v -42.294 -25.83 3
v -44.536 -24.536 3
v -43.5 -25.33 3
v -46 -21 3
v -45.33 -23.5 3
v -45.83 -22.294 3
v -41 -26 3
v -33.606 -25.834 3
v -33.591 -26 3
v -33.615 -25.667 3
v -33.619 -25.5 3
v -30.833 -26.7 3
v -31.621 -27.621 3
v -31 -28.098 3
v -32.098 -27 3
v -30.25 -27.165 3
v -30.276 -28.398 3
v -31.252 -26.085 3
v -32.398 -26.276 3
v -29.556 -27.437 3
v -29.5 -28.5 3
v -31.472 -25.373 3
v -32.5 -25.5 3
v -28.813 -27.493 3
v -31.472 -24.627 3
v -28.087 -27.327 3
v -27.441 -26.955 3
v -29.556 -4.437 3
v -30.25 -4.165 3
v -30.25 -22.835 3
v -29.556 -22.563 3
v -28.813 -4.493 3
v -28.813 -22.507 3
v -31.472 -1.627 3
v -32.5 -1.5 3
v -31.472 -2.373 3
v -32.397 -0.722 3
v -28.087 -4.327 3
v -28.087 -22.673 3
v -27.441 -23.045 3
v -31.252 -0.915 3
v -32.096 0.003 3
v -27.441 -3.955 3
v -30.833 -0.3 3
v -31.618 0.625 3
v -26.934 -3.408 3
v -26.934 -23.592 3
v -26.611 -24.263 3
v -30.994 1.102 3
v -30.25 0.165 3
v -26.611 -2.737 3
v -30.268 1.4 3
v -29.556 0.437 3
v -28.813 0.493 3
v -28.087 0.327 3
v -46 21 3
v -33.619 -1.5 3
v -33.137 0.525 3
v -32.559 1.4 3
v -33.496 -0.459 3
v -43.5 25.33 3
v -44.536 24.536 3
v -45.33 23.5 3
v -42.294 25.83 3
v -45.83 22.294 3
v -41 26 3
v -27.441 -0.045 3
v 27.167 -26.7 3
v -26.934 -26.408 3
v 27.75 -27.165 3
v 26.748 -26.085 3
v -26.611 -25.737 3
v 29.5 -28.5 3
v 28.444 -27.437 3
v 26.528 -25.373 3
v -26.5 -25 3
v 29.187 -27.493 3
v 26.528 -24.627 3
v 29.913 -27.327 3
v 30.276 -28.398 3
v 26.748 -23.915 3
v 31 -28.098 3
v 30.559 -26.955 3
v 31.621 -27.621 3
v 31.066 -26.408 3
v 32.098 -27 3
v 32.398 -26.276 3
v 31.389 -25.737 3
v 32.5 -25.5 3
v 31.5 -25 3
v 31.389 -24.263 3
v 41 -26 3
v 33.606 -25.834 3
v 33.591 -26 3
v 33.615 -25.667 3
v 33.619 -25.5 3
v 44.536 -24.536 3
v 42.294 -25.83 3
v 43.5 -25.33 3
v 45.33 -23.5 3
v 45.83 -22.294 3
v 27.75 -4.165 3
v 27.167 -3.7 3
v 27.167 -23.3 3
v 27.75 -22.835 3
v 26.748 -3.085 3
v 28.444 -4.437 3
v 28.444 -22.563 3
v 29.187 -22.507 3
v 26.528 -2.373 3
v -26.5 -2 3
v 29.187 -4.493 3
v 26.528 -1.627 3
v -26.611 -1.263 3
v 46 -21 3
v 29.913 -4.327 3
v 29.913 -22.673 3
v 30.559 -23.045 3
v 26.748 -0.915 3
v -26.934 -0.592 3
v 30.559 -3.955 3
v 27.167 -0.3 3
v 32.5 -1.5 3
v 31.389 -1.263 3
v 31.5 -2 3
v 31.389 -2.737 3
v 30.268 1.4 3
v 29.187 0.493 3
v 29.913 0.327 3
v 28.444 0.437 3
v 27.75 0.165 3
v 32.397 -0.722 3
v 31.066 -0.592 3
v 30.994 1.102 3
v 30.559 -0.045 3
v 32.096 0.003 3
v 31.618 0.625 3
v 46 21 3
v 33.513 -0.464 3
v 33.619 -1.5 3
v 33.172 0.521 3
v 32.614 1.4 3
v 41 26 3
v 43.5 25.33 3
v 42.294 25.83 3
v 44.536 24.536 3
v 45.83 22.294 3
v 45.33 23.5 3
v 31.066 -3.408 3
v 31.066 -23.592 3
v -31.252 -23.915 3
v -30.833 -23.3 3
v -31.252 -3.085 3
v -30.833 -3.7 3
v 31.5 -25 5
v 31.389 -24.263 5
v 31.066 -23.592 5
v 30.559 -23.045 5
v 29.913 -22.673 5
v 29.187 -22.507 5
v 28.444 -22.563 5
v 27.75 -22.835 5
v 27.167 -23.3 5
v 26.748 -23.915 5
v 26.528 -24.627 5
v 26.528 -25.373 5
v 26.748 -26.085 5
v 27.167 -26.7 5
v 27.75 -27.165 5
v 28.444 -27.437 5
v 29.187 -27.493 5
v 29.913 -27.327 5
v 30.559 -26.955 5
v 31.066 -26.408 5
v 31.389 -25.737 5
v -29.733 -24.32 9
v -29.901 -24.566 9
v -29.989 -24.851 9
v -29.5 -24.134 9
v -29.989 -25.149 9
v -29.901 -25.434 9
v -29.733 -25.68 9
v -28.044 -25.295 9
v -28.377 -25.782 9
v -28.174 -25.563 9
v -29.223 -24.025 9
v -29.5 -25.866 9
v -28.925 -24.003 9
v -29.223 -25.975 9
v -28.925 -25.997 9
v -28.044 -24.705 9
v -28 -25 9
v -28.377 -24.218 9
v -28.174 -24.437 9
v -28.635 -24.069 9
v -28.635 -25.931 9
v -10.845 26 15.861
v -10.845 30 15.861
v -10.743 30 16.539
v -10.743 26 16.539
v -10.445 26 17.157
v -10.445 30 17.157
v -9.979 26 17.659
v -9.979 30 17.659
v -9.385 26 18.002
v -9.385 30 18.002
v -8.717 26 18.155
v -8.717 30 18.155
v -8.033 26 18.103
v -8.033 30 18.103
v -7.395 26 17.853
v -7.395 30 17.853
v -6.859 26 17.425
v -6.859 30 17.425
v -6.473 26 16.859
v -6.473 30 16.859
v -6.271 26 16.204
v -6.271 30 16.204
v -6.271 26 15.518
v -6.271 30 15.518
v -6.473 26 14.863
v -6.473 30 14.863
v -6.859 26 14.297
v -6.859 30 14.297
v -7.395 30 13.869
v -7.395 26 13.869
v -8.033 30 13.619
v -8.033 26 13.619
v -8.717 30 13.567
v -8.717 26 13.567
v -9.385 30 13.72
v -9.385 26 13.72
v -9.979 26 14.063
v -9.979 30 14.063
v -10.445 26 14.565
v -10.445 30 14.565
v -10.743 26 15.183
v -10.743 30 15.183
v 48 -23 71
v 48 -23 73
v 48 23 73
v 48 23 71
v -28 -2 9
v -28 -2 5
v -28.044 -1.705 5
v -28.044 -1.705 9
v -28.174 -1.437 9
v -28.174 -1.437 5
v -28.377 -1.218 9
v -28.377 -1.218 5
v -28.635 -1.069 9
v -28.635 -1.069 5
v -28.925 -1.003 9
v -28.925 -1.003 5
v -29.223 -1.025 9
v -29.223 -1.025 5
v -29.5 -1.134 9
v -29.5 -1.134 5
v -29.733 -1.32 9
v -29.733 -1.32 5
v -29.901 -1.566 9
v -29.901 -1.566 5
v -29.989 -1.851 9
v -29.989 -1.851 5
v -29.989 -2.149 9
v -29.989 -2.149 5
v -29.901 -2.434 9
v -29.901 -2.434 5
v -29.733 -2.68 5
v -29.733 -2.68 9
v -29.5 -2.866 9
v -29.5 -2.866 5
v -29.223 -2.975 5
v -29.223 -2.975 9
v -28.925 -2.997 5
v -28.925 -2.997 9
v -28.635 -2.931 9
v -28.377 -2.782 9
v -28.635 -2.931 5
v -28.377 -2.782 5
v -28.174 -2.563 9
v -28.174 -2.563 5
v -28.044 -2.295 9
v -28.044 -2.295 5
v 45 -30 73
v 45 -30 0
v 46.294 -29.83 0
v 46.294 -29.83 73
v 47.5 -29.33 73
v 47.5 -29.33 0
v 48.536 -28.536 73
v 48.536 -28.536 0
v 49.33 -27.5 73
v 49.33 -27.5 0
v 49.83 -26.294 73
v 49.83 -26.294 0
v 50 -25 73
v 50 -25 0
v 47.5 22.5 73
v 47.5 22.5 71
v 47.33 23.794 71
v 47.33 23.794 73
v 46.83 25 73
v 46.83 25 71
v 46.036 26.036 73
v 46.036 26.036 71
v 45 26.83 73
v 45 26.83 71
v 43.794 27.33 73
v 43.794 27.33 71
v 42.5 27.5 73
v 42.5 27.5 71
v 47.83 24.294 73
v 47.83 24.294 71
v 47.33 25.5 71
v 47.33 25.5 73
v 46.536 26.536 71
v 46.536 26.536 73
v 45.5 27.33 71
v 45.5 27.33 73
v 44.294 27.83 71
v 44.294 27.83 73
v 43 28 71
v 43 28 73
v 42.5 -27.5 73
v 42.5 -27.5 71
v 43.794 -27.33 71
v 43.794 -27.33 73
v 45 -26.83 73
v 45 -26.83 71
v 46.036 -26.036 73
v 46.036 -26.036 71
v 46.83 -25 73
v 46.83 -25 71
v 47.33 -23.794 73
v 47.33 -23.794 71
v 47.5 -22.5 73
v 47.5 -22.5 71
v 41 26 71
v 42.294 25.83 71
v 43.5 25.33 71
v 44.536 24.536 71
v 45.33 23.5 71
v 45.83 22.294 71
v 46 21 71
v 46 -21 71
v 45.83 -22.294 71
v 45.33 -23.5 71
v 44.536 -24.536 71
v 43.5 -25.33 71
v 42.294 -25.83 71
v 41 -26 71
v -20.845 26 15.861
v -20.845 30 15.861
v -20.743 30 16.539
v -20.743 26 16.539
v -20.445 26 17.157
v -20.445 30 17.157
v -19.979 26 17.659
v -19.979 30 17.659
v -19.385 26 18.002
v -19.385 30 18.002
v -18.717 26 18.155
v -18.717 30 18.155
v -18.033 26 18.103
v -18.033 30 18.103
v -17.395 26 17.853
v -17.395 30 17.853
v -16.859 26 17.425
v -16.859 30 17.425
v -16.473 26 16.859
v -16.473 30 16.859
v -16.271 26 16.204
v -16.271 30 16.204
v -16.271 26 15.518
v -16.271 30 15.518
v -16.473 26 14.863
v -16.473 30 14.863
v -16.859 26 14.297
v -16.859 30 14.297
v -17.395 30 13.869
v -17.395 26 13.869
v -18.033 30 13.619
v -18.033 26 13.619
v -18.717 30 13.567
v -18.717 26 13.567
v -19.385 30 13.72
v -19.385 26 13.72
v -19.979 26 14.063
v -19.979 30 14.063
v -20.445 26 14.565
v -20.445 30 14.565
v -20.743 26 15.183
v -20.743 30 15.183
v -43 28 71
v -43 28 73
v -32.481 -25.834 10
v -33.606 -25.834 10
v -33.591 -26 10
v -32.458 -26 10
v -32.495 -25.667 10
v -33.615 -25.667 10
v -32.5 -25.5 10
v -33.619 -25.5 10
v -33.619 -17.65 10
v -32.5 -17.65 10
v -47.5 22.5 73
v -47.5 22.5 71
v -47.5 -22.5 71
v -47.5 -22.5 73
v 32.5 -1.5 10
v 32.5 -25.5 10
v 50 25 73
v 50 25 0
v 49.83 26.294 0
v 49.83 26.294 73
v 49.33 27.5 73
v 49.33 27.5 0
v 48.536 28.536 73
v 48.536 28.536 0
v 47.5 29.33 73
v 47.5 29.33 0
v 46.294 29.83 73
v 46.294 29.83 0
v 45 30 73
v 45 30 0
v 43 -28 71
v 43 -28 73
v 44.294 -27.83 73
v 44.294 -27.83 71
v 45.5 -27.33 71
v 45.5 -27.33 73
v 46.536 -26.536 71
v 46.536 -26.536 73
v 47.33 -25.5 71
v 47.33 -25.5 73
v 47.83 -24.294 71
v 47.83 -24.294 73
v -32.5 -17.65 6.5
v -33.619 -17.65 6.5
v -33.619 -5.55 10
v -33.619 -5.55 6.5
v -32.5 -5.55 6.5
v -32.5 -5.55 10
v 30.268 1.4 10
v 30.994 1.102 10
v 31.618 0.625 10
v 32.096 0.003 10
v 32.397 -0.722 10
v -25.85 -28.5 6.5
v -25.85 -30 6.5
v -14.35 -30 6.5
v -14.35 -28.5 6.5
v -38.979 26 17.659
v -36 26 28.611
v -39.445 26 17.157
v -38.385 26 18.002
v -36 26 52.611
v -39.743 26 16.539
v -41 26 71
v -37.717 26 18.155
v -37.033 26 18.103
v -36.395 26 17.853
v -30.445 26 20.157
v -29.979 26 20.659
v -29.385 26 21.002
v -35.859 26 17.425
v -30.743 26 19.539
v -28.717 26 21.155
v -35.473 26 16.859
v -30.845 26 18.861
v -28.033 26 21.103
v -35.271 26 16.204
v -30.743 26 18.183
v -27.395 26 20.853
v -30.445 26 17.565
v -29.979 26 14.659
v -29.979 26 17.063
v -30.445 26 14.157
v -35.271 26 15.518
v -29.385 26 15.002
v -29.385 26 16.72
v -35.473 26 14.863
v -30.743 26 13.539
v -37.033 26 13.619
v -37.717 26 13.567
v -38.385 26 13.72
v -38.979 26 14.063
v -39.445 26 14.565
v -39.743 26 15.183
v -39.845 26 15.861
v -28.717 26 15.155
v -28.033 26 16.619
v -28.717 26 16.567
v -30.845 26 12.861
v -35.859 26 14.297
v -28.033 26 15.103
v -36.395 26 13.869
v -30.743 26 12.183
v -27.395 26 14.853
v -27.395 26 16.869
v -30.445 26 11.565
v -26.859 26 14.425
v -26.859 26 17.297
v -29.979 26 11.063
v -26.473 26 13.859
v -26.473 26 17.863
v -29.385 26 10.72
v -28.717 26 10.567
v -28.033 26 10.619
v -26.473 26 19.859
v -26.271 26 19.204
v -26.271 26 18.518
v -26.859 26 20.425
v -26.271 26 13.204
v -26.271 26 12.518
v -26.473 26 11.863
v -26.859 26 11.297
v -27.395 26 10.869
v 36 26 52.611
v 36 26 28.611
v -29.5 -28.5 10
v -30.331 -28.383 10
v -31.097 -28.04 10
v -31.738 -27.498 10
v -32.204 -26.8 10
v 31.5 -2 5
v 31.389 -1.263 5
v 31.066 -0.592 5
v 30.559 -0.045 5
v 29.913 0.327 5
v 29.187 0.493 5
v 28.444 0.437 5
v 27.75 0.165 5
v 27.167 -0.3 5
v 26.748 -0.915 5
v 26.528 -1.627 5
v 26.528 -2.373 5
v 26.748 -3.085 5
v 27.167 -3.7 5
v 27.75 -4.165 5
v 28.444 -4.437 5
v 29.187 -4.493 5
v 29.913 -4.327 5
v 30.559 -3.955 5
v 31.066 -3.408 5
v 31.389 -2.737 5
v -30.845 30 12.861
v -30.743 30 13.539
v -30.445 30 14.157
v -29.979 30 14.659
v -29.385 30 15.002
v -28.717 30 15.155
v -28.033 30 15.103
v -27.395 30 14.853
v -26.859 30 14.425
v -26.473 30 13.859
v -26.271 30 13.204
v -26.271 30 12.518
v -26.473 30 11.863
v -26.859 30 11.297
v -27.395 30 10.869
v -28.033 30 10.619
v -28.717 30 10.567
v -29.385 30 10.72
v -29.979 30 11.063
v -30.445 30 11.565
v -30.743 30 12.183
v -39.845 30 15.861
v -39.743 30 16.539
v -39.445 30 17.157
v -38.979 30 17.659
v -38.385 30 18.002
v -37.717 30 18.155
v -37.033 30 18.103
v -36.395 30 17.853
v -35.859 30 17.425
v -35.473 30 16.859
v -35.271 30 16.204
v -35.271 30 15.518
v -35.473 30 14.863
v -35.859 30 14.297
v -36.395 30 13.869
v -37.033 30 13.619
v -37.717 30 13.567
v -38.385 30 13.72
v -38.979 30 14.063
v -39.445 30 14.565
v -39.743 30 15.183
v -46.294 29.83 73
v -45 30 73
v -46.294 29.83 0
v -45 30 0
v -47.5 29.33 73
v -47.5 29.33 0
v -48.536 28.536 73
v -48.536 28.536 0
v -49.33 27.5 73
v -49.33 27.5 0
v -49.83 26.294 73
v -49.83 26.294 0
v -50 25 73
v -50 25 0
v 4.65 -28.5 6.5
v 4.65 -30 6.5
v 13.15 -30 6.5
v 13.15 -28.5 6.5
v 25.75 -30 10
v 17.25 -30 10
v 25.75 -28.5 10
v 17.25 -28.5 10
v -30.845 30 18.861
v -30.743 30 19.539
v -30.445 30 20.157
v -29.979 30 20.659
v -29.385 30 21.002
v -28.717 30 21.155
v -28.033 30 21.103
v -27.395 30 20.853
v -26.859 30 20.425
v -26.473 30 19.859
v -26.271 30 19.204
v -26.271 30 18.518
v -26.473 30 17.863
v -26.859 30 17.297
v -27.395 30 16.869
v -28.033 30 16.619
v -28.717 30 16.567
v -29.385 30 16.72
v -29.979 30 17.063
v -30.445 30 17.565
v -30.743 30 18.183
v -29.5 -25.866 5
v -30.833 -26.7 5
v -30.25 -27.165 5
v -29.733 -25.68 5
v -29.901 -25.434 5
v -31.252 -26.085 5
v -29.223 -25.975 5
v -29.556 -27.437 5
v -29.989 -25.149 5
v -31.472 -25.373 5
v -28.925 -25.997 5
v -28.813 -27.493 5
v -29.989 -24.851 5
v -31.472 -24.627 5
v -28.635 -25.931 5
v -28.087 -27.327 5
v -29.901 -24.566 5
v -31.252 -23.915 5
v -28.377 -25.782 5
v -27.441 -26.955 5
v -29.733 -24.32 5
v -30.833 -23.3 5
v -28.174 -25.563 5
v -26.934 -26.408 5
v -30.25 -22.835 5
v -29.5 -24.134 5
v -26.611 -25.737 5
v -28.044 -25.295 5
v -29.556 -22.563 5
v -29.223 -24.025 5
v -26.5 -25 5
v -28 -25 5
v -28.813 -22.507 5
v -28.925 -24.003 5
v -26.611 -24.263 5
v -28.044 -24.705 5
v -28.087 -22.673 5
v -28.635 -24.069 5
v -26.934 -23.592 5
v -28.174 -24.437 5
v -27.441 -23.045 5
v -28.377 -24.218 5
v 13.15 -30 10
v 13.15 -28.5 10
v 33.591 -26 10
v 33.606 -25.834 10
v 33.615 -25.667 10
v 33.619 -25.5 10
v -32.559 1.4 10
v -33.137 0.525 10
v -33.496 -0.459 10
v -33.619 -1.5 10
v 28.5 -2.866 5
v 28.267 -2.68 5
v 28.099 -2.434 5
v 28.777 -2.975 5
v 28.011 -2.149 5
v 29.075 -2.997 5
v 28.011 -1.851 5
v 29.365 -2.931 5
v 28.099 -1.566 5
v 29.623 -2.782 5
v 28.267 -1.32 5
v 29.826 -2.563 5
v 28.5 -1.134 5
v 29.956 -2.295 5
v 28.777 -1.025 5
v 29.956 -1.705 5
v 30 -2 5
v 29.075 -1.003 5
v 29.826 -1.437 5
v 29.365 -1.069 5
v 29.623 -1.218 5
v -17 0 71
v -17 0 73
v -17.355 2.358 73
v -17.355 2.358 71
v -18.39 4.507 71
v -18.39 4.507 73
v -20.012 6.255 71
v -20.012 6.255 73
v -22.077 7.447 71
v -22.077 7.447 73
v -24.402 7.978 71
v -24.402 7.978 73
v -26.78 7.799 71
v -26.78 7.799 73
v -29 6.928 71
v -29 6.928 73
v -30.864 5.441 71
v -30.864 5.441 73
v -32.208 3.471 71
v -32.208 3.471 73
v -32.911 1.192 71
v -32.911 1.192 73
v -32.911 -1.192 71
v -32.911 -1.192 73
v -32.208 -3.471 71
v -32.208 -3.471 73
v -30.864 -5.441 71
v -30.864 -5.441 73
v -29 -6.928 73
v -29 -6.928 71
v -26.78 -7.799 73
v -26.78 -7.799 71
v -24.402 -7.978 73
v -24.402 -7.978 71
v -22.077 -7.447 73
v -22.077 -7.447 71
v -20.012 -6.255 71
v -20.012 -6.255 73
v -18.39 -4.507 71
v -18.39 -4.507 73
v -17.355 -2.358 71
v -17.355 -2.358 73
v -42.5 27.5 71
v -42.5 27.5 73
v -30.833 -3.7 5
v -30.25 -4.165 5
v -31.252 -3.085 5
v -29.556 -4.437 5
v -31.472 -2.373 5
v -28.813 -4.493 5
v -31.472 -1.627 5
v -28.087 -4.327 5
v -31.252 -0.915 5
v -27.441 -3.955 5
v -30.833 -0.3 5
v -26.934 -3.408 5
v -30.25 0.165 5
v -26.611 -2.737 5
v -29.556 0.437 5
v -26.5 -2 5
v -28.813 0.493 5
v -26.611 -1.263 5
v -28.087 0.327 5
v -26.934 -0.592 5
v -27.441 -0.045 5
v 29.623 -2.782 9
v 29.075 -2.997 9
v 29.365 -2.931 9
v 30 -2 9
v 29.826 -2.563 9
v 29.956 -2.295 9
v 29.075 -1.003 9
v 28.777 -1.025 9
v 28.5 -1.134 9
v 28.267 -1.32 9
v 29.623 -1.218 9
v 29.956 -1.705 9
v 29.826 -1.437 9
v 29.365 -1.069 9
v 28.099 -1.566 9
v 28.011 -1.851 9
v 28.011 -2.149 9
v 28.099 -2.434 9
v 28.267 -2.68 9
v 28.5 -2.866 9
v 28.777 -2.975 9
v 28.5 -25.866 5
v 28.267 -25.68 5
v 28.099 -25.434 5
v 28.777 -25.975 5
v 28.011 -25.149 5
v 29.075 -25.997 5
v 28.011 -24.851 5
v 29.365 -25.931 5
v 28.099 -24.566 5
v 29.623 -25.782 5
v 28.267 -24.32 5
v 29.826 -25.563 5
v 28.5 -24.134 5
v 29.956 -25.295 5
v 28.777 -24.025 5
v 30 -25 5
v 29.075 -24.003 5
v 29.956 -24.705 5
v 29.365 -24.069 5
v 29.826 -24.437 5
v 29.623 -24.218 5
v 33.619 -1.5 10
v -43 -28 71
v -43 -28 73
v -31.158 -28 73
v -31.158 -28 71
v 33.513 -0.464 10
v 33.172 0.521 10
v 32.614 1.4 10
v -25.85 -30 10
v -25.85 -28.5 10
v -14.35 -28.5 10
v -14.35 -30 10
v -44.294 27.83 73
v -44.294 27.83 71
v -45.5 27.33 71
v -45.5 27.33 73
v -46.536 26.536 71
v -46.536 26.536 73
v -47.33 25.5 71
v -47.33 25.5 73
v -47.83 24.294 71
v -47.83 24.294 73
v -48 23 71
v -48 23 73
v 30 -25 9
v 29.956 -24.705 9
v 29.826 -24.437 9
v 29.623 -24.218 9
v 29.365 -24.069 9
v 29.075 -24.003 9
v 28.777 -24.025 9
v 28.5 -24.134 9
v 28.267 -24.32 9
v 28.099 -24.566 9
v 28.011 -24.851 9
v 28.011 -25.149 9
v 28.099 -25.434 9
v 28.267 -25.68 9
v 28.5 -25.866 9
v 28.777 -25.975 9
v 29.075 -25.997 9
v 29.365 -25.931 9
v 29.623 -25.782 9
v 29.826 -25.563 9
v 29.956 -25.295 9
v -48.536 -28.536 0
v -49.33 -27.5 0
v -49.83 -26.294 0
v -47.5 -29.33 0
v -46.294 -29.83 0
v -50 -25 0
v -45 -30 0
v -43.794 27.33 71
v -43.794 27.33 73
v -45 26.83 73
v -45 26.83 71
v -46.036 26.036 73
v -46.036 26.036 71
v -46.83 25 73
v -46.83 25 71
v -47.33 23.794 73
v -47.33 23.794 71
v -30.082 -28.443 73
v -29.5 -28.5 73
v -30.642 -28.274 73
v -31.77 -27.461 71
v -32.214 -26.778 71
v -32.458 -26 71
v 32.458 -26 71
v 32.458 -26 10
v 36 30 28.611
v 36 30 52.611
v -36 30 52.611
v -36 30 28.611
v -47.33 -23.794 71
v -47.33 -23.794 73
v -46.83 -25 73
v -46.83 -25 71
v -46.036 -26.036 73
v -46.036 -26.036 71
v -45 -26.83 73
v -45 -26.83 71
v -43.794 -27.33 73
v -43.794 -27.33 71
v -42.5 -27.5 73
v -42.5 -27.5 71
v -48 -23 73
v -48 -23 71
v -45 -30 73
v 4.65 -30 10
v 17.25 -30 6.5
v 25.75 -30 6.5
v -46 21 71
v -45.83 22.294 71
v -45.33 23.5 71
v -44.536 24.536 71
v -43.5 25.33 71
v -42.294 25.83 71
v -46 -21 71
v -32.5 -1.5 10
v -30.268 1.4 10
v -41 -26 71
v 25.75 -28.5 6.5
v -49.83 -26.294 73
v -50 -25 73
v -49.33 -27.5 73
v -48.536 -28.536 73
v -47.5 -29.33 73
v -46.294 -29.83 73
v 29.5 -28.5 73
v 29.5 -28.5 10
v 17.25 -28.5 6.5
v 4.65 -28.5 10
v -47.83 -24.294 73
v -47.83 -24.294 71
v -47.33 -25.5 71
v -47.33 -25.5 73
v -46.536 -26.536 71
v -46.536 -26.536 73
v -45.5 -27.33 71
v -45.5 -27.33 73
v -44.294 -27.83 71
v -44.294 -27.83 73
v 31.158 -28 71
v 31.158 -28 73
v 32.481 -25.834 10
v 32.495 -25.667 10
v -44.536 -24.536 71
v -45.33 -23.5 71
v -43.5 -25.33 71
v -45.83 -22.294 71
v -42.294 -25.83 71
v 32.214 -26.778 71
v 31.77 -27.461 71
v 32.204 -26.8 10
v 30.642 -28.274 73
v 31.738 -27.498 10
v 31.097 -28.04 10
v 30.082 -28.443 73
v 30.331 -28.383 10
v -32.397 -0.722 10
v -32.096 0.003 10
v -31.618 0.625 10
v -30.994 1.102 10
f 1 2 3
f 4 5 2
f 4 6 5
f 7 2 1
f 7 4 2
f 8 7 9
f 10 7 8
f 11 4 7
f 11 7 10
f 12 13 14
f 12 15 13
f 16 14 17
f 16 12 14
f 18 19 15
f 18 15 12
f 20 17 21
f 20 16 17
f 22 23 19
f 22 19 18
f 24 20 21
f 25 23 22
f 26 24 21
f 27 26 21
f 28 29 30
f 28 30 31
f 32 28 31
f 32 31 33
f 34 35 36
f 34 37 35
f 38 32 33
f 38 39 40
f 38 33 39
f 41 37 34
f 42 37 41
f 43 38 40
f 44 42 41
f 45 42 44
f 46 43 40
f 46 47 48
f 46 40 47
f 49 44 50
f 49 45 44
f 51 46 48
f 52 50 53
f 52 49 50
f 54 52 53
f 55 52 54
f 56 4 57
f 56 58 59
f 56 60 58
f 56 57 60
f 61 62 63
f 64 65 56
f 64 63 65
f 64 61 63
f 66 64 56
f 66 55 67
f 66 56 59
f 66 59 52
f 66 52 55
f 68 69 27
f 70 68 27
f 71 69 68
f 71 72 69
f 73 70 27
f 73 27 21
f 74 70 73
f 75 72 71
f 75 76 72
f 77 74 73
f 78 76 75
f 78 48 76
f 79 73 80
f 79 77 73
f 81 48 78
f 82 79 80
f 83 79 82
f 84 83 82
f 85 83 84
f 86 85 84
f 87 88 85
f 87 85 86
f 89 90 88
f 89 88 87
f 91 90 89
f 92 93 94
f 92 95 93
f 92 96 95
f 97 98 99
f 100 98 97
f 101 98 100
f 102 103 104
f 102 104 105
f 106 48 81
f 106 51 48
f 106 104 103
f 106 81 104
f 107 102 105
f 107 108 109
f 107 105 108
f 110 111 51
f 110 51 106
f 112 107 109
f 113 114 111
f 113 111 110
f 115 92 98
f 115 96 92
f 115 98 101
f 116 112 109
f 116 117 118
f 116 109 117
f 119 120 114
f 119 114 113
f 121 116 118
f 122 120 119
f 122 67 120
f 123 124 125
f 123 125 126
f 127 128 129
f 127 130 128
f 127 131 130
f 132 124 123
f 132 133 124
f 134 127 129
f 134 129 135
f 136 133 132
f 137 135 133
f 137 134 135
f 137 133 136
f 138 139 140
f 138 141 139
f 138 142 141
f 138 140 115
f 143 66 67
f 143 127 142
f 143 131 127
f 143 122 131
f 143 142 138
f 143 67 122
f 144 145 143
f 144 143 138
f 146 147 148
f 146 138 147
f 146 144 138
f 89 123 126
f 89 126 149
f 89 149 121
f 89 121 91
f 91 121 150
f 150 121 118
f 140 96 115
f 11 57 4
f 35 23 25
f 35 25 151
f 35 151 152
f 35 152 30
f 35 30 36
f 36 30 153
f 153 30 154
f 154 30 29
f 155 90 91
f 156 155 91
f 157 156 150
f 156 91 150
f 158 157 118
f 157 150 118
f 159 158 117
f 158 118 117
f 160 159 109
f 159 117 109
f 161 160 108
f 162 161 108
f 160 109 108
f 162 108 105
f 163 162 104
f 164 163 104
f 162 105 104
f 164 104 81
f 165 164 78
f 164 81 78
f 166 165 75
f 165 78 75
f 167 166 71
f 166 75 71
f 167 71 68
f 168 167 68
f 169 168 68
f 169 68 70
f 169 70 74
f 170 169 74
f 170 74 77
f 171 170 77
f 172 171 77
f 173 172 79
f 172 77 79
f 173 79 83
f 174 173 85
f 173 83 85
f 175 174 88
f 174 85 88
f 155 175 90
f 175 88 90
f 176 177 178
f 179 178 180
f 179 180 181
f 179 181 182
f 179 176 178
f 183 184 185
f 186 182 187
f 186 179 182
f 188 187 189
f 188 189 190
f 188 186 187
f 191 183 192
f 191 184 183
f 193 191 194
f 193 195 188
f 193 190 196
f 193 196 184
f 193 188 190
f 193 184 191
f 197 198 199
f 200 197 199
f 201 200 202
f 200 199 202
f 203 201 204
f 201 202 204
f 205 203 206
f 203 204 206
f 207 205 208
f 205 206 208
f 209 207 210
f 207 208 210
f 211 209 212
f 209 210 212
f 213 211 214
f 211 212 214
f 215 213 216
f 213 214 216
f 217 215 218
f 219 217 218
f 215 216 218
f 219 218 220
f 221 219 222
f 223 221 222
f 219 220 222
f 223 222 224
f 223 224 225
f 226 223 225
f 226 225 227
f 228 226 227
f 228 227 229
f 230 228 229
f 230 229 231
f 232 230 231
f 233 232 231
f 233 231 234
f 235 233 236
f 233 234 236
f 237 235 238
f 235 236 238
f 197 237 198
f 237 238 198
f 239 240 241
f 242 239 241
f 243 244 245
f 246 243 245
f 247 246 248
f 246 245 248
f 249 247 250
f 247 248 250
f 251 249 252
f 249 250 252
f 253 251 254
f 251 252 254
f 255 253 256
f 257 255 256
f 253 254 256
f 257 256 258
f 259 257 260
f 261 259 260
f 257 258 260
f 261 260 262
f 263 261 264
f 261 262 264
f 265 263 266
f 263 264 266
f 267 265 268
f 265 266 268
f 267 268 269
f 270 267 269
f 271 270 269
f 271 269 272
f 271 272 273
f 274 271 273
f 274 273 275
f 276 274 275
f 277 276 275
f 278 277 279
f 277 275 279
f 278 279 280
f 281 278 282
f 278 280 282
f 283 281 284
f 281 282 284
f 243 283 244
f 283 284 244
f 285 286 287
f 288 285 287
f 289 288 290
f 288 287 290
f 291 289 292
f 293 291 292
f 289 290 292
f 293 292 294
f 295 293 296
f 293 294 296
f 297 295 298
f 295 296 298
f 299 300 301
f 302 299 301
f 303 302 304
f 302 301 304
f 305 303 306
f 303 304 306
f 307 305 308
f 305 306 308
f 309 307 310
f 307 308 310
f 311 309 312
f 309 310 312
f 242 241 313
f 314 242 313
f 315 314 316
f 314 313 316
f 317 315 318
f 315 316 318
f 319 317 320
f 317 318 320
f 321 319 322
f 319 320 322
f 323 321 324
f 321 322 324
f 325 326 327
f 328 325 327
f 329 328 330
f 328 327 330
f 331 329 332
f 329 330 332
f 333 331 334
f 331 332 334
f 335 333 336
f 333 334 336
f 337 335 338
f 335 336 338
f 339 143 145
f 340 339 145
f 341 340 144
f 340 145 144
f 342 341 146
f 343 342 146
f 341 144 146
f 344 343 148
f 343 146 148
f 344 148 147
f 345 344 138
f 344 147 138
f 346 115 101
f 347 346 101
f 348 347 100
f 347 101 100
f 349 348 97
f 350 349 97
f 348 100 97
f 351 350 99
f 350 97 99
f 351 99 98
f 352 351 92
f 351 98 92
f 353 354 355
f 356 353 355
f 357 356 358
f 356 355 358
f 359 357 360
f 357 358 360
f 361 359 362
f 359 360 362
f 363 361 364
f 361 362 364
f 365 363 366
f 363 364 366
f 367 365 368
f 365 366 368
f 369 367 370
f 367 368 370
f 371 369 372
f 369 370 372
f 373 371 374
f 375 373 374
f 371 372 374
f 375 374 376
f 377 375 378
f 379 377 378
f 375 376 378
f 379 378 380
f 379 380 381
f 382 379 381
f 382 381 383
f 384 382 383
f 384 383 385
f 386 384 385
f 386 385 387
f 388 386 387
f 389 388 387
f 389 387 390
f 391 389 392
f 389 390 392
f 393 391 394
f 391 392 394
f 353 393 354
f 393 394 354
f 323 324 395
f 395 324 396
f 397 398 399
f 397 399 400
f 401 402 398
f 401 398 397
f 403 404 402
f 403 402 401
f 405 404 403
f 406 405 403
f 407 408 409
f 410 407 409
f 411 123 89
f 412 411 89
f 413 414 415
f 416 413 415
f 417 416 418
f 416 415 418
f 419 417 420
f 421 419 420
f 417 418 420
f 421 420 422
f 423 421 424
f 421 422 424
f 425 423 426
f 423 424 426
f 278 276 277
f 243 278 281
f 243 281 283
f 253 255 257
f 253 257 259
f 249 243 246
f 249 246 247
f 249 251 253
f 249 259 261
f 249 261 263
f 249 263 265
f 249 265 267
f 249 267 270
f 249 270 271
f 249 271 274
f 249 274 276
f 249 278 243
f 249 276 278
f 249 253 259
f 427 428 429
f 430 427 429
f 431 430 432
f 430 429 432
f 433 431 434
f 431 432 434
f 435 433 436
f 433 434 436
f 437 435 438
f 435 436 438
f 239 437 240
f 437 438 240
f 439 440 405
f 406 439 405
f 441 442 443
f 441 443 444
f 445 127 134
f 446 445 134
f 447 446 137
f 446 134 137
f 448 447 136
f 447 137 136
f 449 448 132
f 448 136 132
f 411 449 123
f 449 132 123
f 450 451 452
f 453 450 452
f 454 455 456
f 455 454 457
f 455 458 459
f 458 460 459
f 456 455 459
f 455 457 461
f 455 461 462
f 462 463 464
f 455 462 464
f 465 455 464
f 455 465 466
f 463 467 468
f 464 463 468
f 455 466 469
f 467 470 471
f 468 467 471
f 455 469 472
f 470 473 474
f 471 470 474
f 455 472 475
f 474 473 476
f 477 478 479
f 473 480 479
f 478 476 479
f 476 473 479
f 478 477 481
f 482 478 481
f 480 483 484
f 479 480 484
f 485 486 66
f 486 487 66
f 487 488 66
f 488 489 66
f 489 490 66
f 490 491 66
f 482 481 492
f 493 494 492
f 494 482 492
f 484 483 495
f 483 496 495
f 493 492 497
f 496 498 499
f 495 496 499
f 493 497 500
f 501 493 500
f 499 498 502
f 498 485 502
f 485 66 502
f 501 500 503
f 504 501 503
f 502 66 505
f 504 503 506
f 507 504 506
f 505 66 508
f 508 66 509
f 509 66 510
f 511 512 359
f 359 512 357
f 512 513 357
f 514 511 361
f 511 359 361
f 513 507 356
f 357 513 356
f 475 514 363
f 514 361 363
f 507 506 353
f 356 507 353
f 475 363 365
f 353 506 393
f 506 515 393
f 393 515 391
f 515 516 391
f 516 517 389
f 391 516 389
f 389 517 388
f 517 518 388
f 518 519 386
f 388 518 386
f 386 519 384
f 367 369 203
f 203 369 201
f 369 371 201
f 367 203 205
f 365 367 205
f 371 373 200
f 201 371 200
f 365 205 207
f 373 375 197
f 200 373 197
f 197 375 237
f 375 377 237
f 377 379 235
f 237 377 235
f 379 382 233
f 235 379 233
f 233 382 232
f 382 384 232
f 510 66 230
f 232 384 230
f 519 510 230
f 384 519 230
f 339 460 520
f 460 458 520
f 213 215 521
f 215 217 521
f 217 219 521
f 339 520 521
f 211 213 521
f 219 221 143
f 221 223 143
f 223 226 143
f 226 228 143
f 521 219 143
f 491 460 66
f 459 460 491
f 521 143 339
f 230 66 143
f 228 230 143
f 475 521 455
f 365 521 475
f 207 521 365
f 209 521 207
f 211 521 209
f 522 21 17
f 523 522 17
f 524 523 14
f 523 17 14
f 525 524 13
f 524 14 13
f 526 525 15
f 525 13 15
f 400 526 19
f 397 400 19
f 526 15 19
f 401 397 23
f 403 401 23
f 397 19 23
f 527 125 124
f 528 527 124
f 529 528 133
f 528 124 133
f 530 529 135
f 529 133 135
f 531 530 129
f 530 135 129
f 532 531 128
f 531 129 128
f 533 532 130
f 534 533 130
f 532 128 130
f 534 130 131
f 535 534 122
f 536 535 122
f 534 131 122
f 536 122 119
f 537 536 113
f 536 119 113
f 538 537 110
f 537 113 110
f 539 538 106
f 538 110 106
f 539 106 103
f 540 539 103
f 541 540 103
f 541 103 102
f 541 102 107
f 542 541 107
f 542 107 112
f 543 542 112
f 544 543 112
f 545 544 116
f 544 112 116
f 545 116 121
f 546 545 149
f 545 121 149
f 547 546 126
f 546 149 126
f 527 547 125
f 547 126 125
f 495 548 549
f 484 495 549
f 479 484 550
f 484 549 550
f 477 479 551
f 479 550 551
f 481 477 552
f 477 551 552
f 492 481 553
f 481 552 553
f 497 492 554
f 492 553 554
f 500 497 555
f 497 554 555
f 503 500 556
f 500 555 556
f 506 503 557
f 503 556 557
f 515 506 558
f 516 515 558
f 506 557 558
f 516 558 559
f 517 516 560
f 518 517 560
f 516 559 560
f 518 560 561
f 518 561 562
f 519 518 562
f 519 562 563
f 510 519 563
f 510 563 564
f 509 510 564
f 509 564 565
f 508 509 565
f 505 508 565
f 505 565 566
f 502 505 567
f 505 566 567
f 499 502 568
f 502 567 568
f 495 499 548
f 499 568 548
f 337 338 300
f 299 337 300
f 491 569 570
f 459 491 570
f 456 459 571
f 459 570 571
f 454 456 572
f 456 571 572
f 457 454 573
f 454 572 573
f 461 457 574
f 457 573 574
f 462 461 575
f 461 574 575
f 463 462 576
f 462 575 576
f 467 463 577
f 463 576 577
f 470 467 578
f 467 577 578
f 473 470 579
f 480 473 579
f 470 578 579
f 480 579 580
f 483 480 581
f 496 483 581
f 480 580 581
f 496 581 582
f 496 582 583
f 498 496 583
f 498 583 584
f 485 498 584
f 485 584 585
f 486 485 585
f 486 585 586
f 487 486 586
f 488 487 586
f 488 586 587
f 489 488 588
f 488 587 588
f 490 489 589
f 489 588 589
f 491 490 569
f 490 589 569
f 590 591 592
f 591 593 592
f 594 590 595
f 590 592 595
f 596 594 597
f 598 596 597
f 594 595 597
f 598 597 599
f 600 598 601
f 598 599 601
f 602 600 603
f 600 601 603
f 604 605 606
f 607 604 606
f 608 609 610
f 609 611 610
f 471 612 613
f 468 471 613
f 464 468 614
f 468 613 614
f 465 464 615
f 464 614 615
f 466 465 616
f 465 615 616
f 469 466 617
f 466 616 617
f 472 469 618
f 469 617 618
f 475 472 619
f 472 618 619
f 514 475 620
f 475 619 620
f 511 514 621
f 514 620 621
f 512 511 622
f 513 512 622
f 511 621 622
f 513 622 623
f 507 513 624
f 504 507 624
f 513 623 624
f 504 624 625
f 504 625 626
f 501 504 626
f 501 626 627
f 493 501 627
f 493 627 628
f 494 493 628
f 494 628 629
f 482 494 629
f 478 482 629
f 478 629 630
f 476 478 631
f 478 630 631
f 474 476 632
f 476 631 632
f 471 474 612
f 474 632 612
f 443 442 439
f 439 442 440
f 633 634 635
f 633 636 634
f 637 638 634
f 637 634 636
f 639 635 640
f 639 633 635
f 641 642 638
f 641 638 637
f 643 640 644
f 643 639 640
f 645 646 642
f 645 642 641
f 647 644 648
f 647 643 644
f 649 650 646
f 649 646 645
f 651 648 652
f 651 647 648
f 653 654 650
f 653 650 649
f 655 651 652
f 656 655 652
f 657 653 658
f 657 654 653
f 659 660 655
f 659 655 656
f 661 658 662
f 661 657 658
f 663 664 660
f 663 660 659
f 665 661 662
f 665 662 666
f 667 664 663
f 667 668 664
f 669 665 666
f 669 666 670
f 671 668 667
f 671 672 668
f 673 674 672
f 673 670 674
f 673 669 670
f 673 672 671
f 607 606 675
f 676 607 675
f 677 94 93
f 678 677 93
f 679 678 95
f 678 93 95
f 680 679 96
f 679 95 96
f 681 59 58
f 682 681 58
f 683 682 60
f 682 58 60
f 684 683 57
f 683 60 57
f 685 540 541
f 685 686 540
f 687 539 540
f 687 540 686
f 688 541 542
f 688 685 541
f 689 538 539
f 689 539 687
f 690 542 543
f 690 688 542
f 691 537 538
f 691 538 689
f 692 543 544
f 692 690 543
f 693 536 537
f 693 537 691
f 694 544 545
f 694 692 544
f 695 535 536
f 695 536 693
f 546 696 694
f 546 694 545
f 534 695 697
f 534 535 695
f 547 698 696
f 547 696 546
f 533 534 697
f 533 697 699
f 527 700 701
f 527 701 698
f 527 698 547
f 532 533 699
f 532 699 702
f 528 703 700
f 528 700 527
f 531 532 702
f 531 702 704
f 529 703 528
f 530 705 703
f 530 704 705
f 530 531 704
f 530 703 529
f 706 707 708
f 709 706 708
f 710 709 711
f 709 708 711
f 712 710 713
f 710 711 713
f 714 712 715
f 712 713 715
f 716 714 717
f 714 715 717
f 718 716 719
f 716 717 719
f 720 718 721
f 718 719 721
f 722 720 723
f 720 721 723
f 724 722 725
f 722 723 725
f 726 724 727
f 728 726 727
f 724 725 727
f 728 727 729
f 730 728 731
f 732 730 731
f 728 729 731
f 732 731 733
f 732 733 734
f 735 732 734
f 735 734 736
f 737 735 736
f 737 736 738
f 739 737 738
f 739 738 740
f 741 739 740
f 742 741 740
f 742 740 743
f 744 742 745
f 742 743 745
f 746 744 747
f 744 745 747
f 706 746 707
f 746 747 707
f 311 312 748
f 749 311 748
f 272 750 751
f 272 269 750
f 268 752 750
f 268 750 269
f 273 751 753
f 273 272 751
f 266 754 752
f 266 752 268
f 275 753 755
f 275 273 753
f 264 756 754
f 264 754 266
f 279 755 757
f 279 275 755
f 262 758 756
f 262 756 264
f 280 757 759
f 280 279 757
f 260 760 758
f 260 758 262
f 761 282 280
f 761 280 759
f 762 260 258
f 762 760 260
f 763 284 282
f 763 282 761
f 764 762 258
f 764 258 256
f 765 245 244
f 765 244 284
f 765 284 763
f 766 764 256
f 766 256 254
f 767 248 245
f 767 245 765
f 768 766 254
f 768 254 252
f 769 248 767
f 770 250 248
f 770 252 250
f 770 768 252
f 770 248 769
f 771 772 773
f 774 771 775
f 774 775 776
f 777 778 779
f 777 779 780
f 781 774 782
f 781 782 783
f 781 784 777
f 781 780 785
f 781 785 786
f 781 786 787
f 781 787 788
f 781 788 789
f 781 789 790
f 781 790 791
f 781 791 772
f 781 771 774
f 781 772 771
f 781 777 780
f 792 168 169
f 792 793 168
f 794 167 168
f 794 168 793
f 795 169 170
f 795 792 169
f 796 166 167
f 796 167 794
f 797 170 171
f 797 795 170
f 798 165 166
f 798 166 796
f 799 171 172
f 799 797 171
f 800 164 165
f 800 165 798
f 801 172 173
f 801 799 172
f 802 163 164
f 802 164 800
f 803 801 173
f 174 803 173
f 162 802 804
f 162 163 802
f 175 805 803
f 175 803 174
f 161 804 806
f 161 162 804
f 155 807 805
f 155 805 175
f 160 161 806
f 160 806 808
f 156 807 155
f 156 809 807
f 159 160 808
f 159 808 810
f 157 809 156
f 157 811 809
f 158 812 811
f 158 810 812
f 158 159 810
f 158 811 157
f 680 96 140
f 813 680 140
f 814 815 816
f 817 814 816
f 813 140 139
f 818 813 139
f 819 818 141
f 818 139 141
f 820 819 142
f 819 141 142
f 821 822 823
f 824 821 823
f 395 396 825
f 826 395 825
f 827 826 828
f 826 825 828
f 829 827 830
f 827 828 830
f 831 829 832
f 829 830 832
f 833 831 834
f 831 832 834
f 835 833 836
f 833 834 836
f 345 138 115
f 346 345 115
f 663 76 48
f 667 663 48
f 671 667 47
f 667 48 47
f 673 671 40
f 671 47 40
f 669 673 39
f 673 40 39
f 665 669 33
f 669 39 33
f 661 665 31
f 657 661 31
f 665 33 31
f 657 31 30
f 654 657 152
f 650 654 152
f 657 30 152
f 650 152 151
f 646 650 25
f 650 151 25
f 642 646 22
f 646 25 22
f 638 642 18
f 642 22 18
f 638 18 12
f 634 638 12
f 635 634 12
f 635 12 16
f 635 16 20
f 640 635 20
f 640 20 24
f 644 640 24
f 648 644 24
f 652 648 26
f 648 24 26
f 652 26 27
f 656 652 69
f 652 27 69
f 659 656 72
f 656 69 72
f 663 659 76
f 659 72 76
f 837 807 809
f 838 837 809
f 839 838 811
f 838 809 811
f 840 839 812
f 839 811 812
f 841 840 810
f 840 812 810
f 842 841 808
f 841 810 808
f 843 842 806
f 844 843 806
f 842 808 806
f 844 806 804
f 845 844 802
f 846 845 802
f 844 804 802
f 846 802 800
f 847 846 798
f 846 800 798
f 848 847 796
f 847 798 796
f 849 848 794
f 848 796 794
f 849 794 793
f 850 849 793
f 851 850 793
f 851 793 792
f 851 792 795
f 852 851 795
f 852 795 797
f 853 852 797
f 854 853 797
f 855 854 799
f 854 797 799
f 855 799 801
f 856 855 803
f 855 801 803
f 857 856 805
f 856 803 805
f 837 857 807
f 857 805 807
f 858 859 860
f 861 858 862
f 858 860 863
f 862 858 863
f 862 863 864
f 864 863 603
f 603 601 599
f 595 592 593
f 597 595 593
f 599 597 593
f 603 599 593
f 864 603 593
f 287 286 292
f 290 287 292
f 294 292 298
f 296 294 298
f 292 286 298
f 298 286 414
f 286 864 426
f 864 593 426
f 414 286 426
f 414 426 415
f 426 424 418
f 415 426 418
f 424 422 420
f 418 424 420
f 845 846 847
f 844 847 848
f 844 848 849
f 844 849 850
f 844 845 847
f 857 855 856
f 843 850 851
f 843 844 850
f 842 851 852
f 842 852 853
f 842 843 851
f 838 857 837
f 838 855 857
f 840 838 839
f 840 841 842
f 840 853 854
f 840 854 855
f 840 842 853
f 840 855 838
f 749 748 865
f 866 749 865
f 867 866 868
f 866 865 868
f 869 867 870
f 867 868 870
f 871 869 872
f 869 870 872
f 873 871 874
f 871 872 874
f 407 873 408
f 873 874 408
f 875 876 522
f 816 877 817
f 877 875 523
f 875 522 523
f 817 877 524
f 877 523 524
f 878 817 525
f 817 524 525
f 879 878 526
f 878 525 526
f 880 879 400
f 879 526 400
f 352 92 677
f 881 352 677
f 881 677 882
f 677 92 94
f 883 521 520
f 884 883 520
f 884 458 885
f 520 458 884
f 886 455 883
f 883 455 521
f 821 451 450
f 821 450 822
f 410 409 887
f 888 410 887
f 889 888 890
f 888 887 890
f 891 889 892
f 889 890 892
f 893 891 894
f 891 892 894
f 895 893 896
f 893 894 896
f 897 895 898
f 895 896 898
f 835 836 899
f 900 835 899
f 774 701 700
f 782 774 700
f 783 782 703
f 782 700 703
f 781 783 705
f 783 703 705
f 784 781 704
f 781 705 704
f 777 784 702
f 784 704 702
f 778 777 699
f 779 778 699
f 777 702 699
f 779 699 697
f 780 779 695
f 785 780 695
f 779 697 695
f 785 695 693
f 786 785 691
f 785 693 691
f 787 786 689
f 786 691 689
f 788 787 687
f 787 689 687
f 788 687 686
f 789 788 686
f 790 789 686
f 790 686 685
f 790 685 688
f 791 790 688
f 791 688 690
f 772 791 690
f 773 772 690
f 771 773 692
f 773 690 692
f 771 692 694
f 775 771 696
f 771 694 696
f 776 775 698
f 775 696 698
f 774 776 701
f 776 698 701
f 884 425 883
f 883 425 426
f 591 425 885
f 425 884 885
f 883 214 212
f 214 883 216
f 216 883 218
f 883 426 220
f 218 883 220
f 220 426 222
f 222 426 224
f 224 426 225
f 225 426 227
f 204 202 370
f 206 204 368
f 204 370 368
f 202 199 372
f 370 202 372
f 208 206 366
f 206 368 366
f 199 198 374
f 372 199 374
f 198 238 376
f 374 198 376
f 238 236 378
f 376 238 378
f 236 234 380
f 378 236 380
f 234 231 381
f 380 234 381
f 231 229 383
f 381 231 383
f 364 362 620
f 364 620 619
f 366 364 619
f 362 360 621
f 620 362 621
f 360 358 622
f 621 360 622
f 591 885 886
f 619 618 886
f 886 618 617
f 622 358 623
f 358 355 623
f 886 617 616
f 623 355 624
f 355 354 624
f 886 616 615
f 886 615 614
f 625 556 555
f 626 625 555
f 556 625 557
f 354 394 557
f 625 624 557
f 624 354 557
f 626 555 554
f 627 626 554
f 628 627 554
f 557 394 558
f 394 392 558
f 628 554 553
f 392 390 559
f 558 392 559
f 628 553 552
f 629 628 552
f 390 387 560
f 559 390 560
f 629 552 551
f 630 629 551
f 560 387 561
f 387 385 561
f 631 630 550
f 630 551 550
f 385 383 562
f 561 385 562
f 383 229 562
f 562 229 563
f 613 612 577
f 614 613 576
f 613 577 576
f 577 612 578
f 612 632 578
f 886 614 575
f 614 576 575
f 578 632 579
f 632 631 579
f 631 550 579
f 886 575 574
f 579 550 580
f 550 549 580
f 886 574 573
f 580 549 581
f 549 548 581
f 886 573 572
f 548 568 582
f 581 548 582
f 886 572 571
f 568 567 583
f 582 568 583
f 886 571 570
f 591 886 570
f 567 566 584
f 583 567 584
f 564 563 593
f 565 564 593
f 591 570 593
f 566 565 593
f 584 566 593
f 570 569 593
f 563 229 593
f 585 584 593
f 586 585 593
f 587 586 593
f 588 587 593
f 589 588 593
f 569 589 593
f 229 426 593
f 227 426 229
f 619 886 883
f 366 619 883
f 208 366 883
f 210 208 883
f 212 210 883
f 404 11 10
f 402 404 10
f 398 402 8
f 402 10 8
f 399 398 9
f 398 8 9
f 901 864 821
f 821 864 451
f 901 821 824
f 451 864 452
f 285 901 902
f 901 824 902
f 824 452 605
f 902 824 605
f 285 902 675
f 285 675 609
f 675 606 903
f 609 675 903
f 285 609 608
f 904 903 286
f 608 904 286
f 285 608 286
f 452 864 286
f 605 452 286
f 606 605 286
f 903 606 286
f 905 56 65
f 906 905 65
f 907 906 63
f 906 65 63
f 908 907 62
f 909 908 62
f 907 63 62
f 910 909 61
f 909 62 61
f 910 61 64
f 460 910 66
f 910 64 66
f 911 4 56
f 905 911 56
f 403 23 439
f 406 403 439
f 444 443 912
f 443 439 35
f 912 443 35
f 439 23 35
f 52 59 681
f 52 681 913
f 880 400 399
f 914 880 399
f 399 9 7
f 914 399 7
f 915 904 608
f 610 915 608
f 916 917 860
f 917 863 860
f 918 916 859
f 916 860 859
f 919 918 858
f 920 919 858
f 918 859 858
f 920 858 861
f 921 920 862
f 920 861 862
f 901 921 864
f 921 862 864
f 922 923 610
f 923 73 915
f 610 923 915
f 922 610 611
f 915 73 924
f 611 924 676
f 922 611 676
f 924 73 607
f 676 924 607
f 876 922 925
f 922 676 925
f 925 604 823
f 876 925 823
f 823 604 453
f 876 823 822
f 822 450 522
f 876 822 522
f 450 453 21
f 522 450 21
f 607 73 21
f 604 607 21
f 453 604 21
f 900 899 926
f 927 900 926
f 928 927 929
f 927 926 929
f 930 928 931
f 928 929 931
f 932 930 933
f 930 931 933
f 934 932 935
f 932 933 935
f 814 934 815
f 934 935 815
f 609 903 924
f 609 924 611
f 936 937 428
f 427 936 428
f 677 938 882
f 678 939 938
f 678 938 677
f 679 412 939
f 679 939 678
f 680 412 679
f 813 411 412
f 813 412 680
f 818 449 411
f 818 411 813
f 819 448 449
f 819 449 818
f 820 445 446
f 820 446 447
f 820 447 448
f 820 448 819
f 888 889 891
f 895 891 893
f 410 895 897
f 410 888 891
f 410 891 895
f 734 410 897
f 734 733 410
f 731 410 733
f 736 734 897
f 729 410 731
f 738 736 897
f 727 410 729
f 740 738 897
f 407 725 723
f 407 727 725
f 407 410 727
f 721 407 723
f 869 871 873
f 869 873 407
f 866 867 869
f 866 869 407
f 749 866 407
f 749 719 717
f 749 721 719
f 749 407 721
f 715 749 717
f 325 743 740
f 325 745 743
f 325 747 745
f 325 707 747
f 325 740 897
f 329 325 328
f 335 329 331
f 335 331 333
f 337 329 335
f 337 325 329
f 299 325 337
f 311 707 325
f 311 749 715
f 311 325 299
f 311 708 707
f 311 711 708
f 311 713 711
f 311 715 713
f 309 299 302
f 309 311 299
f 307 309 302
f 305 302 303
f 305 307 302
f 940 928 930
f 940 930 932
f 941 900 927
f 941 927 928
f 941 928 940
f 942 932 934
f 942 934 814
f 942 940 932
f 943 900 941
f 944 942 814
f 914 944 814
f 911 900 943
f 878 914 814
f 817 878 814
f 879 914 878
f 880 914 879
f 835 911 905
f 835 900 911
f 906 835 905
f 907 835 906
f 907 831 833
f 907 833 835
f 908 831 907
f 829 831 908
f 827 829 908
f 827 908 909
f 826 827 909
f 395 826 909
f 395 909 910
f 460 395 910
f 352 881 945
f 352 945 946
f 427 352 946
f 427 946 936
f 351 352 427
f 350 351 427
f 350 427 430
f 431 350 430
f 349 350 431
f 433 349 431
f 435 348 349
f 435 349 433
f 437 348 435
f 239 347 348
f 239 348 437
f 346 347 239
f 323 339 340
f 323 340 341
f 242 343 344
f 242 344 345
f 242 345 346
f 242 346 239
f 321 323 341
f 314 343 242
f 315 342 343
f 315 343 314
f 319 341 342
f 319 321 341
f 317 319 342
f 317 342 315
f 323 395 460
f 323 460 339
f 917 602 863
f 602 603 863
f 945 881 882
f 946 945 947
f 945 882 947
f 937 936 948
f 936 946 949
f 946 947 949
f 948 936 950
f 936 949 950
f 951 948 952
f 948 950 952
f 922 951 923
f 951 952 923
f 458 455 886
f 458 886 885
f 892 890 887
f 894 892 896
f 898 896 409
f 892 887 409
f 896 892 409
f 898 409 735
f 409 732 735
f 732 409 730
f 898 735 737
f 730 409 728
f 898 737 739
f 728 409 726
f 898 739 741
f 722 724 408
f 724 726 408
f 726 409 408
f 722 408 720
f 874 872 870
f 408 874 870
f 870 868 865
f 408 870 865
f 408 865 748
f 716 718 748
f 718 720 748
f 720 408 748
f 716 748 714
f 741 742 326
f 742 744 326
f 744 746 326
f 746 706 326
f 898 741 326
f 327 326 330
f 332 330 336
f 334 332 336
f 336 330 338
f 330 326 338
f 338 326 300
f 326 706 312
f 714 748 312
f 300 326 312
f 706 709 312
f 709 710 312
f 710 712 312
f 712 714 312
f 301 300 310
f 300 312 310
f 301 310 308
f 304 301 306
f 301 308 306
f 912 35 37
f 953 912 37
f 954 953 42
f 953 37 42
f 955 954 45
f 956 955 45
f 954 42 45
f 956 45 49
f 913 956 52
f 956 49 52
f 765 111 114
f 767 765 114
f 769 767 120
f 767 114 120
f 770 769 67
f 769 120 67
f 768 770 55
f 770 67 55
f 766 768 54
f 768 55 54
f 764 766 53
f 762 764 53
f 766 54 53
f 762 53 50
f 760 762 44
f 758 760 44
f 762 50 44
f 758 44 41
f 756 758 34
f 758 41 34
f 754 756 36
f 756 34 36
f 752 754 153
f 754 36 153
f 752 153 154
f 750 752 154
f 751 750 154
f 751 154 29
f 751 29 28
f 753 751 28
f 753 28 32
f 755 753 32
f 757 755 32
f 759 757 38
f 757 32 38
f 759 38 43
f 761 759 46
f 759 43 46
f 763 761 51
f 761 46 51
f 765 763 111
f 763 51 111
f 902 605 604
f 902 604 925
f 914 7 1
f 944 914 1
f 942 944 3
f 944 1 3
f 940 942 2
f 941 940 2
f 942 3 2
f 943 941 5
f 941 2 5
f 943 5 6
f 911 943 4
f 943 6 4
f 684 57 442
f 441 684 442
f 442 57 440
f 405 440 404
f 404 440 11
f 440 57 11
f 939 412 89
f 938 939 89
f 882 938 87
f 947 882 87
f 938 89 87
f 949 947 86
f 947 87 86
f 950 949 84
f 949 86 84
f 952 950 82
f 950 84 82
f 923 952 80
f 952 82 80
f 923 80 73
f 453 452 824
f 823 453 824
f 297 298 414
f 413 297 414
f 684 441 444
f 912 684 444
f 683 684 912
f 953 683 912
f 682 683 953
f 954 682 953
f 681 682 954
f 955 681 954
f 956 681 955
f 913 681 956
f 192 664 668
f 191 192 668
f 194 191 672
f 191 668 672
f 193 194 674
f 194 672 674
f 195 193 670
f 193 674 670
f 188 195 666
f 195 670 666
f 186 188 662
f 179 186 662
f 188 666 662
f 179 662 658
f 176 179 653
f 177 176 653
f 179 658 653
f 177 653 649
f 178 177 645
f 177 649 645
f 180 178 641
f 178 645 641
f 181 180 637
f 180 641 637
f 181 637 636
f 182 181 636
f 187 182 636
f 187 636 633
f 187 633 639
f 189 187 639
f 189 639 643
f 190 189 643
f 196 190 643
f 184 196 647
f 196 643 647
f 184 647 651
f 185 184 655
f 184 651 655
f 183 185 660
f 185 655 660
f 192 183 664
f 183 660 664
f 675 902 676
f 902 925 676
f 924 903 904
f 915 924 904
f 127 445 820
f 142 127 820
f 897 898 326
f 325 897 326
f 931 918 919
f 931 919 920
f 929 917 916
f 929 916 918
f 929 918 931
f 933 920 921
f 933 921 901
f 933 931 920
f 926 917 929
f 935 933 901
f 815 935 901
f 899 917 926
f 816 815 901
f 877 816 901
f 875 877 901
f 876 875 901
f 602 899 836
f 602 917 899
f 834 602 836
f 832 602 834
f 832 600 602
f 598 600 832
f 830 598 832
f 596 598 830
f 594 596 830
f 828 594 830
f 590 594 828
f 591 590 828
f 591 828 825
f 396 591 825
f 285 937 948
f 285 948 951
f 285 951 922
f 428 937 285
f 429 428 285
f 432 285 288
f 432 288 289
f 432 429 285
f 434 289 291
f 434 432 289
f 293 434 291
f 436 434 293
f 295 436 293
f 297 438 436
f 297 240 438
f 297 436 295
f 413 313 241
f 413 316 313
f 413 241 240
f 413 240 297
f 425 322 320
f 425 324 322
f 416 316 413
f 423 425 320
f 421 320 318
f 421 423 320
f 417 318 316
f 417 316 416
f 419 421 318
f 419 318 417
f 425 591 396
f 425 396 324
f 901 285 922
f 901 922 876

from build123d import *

# Parameters (mm, degrees)
F1_DEPTH  = 3
F3_DEPTH  = 7
F4_W      = 11.5
F4_H      = 3.5
F4_W_2    = 8.5
F5_DEPTH  = 1.5
F6_R      = 2.5
F7_DEPTH  = 2
F8_R      = 1
F9_DEPTH  = 4
F10_W     = 12.1
F10_H     = 3.5
F11_DEPTH = 1.118519
F13_DEPTH = 7
F15_DEPTH = 63
F17_DEPTH = 2
F19_W     = 72
F19_H     = 24
F20_DEPTH = 4
F21_R     = 2.3
F22_DEPTH = 4
F23_W     = 66.979637
F23_H     = 1.6
F24_DEPTH = 7
F26_DEPTH = 2
F27_R     = 8
F28_DEPTH = 2


with BuildPart() as f1:
    # F0 (on Top) → F1 (new body)
    with BuildSketch(Plane.XY):
        with BuildLine():
            Line((-45, -30), (45, -30))
            ThreePointArc((45, -30), (48.535534, -28.535534), (50, -25))
            Line((50, -25), (50, 25))
            ThreePointArc((50, 25), (48.535534, 28.535534), (45, 30))
            Line((45, 30), (-45, 30))
            ThreePointArc((-45, 30), (-48.535534, 28.535534), (-50, 25))
            Line((-50, 25), (-50, -25))
            ThreePointArc((-50, -25), (-48.535534, -28.535534), (-45, -30))
        make_face()
    extrude(amount=F1_DEPTH)

    # F2 (on face) → F3 (join)
    with BuildSketch(Plane.XY.offset(3)):
        with BuildLine():
            ThreePointArc((-29.118519, 3), (-32.300499, 1.681981), (-33.618519, -1.5))
            Line((-33.618519, -1.5), (-33.618519, -25.5))
            ThreePointArc((-33.618519, -25.5), (-32.300499, -28.681981), (-29.118519, -30))
            Line((-29.118519, -30), (29.118519, -30))
            ThreePointArc((29.118519, -30), (32.300499, -28.681981), (33.618519, -25.5))
            Line((33.618519, -25.5), (33.618519, -1.5))
            ThreePointArc((33.618519, -1.5), (32.580884, 1.44001), (29.881481, 3))
            Line((29.881481, 3), (-29.118519, 3))
        make_face()
        with BuildLine():
            Line((-32.5, -25.5), (-32.5, -1.5))
            ThreePointArc((-32.5, -1.5), (-31.62132, 0.62132), (-29.5, 1.5))
            Line((-29.5, 1.5), (29.5, 1.5))
            ThreePointArc((29.5, 1.5), (31.62132, 0.62132), (32.5, -1.5))
            Line((32.5, -1.5), (32.5, -25.5))
            ThreePointArc((32.5, -25.5), (31.62132, -27.62132), (29.5, -28.5))
            Line((29.5, -28.5), (-29.5, -28.5))
            ThreePointArc((-29.5, -28.5), (-31.62132, -27.62132), (-32.5, -25.5))
        make_face(mode=Mode.SUBTRACT)
    extrude(amount=F3_DEPTH)

    # F4 (on face) → F5 (cut, through all)
    with BuildSketch(Plane.XZ.offset(30)):
        with Locations((-20.1, 8.25)):
            Rectangle(F4_W, F4_H)
        with Locations((8.9, 8.25)):
            Rectangle(F4_W_2, F4_H)
        with Locations((21.5, 8.25)):
            Rectangle(F4_W_2, F4_H)
    extrude(amount=-F5_DEPTH, mode=Mode.SUBTRACT)

    # F6 (on face) → F7 (join)
    with BuildSketch(Plane.XY.offset(3)):
        with Locations((-29, -2)):
            Circle(F6_R)
        with Locations((29, -2)):
            Circle(F6_R)
        with Locations((29, -25)):
            Circle(F6_R)
        with Locations((-29, -25)):
            Circle(F6_R)
    extrude(amount=F7_DEPTH)

    # F8 (on face) → F9 (join)
    with BuildSketch(Plane.XY.offset(5)):
        with Locations((-29, -2)):
            Circle(F8_R)
        with Locations((29, -2)):
            Circle(F8_R)
        with Locations((29, -25)):
            Circle(F8_R)
        with Locations((-29, -25)):
            Circle(F8_R)
    extrude(amount=F9_DEPTH)

    # F10 (on face) → F11 (cut, through all)
    with BuildSketch(Plane(origin=(-33.618519, 0, 0), x_dir=(0, -1, 0), z_dir=(-1, 0, 0))):
        with Locations((11.6, 8.25)):
            Rectangle(F10_W, F10_H)
    extrude(amount=-F11_DEPTH, mode=Mode.SUBTRACT)

    # F12 (on face) → F13 (join, through all)
    with BuildSketch(Plane.XY.offset(3)):
        with BuildLine():
            ThreePointArc((50, 25), (48.535534, 28.535534), (45, 30))
            Line((45, 30), (-45, 30))
            ThreePointArc((-45, 30), (-48.535534, 28.535534), (-50, 25))
            Line((-50, 25), (-50, -25))
            ThreePointArc((-50, -25), (-48.535534, -28.535534), (-45, -30))
            Line((-45, -30), (-29.118519, -30))
            ThreePointArc((-29.118519, -30), (-32.118519, -28.854102), (-33.590654, -26))
            Line((-33.590654, -26), (-41, -26))
            ThreePointArc((-41, -26), (-44.535534, -24.535534), (-46, -21))
            Line((-46, -21), (-46, 21))
            ThreePointArc((-46, 21), (-44.535534, 24.535534), (-41, 26))
            Line((-41, 26), (41, 26))
            ThreePointArc((41, 26), (44.535534, 24.535534), (46, 21))
            Line((46, 21), (46, -21))
            ThreePointArc((46, -21), (44.535534, -24.535534), (41, -26))
            Line((41, -26), (33.590654, -26))
            ThreePointArc((33.590654, -26), (32.118519, -28.854102), (29.118519, -30))
            Line((29.118519, -30), (45, -30))
            ThreePointArc((45, -30), (48.535534, -28.535534), (50, -25))
            Line((50, -25), (50, 25))
        make_face()
    extrude(amount=F13_DEPTH)

    # F14 (on face) → F15 (join)
    with BuildSketch(Plane.XY.offset(10)):
        with BuildLine():
            ThreePointArc((50, 25), (48.535534, 28.535534), (45, 30))
            Line((45, 30), (-45, 30))
            ThreePointArc((-45, 30), (-48.535534, 28.535534), (-50, 25))
            Line((-50, 25), (-50, -25))
            ThreePointArc((-50, -25), (-48.535534, -28.535534), (-45, -30))
            Line((-45, -30), (45, -30))
            ThreePointArc((45, -30), (48.535534, -28.535534), (50, -25))
            Line((50, -25), (50, 25))
        make_face()
        with BuildLine():
            Line((-41, 26), (41, 26))
            ThreePointArc((41, 26), (44.535534, 24.535534), (46, 21))
            Line((46, 21), (46, -21))
            ThreePointArc((46, -21), (44.535534, -24.535534), (41, -26))
            Line((41, -26), (32.45804, -26))
            ThreePointArc((32.45804, -26), (31.436492, -27.791288), (29.5, -28.5))
            Line((29.5, -28.5), (-29.5, -28.5))
            ThreePointArc((-29.5, -28.5), (-31.436492, -27.791288), (-32.45804, -26))
            Line((-32.45804, -26), (-41, -26))
            ThreePointArc((-41, -26), (-44.535534, -24.535534), (-46, -21))
            Line((-46, -21), (-46, 21))
            ThreePointArc((-46, 21), (-44.535534, 24.535534), (-41, 26))
        make_face(mode=Mode.SUBTRACT)
    extrude(amount=F15_DEPTH)

    # F16 (on face) → F17 (cut)
    with BuildSketch(Plane.XY.offset(73)):
        with BuildLine():
            ThreePointArc((48, 23), (46.535534, 26.535534), (43, 28))
            Line((43, 28), (-43, 28))
            ThreePointArc((-43, 28), (-46.535534, 26.535534), (-48, 23))
            Line((-48, 23), (-48, -23))
            ThreePointArc((-48, -23), (-46.535534, -26.535534), (-43, -28))
            Line((-43, -28), (43, -28))
            ThreePointArc((43, -28), (46.535534, -26.535534), (48, -23))
            Line((48, -23), (48, 23))
        make_face()
    extrude(amount=-F17_DEPTH, mode=Mode.SUBTRACT)

    # F19 (on face) → F20 (cut, through all)
    with BuildSketch(Plane.XZ.offset(-26)):
        with Locations((0, 40.611031)):
            Rectangle(F19_W, F19_H)
    extrude(amount=-F20_DEPTH, mode=Mode.SUBTRACT)

    # F21 (on face) → F22 (cut, through all)
    with BuildSketch(Plane(origin=(0, 30, 0), x_dir=(-1, 0, 0), z_dir=(0, 1, 0))):
        with Locations((8.545, 15.861031)):
            Circle(F21_R)
        with Locations((18.545, 15.861031)):
            Circle(F21_R)
        with Locations((28.545, 12.861031)):
            Circle(F21_R)
        with Locations((28.545, 18.861031)):
            Circle(F21_R)
        with Locations((37.545, 15.861031)):
            Circle(F21_R)
    extrude(amount=-F22_DEPTH, mode=Mode.SUBTRACT)

    # F23 (on face) → F24 (cut, through all)
    with BuildSketch(Plane.XY.offset(10)):
        with Locations((-0.128701, 2.2)):
            Rectangle(F23_W, F23_H)
    extrude(amount=-F24_DEPTH, mode=Mode.SUBTRACT)


with BuildPart() as f26:
    # F25 (on face) → F26 (new body)
    with BuildSketch(Plane.XY.offset(71)):
        with BuildLine():
            ThreePointArc((47.5, 22.5), (46.035534, 26.035534), (42.5, 27.5))
            Line((42.5, 27.5), (-42.5, 27.5))
            ThreePointArc((-42.5, 27.5), (-46.035534, 26.035534), (-47.5, 22.5))
            Line((-47.5, 22.5), (-47.5, -22.5))
            ThreePointArc((-47.5, -22.5), (-46.035534, -26.035534), (-42.5, -27.5))
            Line((-42.5, -27.5), (42.5, -27.5))
            ThreePointArc((42.5, -27.5), (46.035534, -26.035534), (47.5, -22.5))
            Line((47.5, -22.5), (47.5, 22.5))
        make_face()
    extrude(amount=F26_DEPTH)

    # F27 (on face) → F28 (cut, through all)
    with BuildSketch(Plane.XY.offset(73)):
        with Locations((-25, 0)):
            Circle(F27_R)
    extrude(amount=-F28_DEPTH, mode=Mode.SUBTRACT)


solid = Compound([f1.part, f26.part])
